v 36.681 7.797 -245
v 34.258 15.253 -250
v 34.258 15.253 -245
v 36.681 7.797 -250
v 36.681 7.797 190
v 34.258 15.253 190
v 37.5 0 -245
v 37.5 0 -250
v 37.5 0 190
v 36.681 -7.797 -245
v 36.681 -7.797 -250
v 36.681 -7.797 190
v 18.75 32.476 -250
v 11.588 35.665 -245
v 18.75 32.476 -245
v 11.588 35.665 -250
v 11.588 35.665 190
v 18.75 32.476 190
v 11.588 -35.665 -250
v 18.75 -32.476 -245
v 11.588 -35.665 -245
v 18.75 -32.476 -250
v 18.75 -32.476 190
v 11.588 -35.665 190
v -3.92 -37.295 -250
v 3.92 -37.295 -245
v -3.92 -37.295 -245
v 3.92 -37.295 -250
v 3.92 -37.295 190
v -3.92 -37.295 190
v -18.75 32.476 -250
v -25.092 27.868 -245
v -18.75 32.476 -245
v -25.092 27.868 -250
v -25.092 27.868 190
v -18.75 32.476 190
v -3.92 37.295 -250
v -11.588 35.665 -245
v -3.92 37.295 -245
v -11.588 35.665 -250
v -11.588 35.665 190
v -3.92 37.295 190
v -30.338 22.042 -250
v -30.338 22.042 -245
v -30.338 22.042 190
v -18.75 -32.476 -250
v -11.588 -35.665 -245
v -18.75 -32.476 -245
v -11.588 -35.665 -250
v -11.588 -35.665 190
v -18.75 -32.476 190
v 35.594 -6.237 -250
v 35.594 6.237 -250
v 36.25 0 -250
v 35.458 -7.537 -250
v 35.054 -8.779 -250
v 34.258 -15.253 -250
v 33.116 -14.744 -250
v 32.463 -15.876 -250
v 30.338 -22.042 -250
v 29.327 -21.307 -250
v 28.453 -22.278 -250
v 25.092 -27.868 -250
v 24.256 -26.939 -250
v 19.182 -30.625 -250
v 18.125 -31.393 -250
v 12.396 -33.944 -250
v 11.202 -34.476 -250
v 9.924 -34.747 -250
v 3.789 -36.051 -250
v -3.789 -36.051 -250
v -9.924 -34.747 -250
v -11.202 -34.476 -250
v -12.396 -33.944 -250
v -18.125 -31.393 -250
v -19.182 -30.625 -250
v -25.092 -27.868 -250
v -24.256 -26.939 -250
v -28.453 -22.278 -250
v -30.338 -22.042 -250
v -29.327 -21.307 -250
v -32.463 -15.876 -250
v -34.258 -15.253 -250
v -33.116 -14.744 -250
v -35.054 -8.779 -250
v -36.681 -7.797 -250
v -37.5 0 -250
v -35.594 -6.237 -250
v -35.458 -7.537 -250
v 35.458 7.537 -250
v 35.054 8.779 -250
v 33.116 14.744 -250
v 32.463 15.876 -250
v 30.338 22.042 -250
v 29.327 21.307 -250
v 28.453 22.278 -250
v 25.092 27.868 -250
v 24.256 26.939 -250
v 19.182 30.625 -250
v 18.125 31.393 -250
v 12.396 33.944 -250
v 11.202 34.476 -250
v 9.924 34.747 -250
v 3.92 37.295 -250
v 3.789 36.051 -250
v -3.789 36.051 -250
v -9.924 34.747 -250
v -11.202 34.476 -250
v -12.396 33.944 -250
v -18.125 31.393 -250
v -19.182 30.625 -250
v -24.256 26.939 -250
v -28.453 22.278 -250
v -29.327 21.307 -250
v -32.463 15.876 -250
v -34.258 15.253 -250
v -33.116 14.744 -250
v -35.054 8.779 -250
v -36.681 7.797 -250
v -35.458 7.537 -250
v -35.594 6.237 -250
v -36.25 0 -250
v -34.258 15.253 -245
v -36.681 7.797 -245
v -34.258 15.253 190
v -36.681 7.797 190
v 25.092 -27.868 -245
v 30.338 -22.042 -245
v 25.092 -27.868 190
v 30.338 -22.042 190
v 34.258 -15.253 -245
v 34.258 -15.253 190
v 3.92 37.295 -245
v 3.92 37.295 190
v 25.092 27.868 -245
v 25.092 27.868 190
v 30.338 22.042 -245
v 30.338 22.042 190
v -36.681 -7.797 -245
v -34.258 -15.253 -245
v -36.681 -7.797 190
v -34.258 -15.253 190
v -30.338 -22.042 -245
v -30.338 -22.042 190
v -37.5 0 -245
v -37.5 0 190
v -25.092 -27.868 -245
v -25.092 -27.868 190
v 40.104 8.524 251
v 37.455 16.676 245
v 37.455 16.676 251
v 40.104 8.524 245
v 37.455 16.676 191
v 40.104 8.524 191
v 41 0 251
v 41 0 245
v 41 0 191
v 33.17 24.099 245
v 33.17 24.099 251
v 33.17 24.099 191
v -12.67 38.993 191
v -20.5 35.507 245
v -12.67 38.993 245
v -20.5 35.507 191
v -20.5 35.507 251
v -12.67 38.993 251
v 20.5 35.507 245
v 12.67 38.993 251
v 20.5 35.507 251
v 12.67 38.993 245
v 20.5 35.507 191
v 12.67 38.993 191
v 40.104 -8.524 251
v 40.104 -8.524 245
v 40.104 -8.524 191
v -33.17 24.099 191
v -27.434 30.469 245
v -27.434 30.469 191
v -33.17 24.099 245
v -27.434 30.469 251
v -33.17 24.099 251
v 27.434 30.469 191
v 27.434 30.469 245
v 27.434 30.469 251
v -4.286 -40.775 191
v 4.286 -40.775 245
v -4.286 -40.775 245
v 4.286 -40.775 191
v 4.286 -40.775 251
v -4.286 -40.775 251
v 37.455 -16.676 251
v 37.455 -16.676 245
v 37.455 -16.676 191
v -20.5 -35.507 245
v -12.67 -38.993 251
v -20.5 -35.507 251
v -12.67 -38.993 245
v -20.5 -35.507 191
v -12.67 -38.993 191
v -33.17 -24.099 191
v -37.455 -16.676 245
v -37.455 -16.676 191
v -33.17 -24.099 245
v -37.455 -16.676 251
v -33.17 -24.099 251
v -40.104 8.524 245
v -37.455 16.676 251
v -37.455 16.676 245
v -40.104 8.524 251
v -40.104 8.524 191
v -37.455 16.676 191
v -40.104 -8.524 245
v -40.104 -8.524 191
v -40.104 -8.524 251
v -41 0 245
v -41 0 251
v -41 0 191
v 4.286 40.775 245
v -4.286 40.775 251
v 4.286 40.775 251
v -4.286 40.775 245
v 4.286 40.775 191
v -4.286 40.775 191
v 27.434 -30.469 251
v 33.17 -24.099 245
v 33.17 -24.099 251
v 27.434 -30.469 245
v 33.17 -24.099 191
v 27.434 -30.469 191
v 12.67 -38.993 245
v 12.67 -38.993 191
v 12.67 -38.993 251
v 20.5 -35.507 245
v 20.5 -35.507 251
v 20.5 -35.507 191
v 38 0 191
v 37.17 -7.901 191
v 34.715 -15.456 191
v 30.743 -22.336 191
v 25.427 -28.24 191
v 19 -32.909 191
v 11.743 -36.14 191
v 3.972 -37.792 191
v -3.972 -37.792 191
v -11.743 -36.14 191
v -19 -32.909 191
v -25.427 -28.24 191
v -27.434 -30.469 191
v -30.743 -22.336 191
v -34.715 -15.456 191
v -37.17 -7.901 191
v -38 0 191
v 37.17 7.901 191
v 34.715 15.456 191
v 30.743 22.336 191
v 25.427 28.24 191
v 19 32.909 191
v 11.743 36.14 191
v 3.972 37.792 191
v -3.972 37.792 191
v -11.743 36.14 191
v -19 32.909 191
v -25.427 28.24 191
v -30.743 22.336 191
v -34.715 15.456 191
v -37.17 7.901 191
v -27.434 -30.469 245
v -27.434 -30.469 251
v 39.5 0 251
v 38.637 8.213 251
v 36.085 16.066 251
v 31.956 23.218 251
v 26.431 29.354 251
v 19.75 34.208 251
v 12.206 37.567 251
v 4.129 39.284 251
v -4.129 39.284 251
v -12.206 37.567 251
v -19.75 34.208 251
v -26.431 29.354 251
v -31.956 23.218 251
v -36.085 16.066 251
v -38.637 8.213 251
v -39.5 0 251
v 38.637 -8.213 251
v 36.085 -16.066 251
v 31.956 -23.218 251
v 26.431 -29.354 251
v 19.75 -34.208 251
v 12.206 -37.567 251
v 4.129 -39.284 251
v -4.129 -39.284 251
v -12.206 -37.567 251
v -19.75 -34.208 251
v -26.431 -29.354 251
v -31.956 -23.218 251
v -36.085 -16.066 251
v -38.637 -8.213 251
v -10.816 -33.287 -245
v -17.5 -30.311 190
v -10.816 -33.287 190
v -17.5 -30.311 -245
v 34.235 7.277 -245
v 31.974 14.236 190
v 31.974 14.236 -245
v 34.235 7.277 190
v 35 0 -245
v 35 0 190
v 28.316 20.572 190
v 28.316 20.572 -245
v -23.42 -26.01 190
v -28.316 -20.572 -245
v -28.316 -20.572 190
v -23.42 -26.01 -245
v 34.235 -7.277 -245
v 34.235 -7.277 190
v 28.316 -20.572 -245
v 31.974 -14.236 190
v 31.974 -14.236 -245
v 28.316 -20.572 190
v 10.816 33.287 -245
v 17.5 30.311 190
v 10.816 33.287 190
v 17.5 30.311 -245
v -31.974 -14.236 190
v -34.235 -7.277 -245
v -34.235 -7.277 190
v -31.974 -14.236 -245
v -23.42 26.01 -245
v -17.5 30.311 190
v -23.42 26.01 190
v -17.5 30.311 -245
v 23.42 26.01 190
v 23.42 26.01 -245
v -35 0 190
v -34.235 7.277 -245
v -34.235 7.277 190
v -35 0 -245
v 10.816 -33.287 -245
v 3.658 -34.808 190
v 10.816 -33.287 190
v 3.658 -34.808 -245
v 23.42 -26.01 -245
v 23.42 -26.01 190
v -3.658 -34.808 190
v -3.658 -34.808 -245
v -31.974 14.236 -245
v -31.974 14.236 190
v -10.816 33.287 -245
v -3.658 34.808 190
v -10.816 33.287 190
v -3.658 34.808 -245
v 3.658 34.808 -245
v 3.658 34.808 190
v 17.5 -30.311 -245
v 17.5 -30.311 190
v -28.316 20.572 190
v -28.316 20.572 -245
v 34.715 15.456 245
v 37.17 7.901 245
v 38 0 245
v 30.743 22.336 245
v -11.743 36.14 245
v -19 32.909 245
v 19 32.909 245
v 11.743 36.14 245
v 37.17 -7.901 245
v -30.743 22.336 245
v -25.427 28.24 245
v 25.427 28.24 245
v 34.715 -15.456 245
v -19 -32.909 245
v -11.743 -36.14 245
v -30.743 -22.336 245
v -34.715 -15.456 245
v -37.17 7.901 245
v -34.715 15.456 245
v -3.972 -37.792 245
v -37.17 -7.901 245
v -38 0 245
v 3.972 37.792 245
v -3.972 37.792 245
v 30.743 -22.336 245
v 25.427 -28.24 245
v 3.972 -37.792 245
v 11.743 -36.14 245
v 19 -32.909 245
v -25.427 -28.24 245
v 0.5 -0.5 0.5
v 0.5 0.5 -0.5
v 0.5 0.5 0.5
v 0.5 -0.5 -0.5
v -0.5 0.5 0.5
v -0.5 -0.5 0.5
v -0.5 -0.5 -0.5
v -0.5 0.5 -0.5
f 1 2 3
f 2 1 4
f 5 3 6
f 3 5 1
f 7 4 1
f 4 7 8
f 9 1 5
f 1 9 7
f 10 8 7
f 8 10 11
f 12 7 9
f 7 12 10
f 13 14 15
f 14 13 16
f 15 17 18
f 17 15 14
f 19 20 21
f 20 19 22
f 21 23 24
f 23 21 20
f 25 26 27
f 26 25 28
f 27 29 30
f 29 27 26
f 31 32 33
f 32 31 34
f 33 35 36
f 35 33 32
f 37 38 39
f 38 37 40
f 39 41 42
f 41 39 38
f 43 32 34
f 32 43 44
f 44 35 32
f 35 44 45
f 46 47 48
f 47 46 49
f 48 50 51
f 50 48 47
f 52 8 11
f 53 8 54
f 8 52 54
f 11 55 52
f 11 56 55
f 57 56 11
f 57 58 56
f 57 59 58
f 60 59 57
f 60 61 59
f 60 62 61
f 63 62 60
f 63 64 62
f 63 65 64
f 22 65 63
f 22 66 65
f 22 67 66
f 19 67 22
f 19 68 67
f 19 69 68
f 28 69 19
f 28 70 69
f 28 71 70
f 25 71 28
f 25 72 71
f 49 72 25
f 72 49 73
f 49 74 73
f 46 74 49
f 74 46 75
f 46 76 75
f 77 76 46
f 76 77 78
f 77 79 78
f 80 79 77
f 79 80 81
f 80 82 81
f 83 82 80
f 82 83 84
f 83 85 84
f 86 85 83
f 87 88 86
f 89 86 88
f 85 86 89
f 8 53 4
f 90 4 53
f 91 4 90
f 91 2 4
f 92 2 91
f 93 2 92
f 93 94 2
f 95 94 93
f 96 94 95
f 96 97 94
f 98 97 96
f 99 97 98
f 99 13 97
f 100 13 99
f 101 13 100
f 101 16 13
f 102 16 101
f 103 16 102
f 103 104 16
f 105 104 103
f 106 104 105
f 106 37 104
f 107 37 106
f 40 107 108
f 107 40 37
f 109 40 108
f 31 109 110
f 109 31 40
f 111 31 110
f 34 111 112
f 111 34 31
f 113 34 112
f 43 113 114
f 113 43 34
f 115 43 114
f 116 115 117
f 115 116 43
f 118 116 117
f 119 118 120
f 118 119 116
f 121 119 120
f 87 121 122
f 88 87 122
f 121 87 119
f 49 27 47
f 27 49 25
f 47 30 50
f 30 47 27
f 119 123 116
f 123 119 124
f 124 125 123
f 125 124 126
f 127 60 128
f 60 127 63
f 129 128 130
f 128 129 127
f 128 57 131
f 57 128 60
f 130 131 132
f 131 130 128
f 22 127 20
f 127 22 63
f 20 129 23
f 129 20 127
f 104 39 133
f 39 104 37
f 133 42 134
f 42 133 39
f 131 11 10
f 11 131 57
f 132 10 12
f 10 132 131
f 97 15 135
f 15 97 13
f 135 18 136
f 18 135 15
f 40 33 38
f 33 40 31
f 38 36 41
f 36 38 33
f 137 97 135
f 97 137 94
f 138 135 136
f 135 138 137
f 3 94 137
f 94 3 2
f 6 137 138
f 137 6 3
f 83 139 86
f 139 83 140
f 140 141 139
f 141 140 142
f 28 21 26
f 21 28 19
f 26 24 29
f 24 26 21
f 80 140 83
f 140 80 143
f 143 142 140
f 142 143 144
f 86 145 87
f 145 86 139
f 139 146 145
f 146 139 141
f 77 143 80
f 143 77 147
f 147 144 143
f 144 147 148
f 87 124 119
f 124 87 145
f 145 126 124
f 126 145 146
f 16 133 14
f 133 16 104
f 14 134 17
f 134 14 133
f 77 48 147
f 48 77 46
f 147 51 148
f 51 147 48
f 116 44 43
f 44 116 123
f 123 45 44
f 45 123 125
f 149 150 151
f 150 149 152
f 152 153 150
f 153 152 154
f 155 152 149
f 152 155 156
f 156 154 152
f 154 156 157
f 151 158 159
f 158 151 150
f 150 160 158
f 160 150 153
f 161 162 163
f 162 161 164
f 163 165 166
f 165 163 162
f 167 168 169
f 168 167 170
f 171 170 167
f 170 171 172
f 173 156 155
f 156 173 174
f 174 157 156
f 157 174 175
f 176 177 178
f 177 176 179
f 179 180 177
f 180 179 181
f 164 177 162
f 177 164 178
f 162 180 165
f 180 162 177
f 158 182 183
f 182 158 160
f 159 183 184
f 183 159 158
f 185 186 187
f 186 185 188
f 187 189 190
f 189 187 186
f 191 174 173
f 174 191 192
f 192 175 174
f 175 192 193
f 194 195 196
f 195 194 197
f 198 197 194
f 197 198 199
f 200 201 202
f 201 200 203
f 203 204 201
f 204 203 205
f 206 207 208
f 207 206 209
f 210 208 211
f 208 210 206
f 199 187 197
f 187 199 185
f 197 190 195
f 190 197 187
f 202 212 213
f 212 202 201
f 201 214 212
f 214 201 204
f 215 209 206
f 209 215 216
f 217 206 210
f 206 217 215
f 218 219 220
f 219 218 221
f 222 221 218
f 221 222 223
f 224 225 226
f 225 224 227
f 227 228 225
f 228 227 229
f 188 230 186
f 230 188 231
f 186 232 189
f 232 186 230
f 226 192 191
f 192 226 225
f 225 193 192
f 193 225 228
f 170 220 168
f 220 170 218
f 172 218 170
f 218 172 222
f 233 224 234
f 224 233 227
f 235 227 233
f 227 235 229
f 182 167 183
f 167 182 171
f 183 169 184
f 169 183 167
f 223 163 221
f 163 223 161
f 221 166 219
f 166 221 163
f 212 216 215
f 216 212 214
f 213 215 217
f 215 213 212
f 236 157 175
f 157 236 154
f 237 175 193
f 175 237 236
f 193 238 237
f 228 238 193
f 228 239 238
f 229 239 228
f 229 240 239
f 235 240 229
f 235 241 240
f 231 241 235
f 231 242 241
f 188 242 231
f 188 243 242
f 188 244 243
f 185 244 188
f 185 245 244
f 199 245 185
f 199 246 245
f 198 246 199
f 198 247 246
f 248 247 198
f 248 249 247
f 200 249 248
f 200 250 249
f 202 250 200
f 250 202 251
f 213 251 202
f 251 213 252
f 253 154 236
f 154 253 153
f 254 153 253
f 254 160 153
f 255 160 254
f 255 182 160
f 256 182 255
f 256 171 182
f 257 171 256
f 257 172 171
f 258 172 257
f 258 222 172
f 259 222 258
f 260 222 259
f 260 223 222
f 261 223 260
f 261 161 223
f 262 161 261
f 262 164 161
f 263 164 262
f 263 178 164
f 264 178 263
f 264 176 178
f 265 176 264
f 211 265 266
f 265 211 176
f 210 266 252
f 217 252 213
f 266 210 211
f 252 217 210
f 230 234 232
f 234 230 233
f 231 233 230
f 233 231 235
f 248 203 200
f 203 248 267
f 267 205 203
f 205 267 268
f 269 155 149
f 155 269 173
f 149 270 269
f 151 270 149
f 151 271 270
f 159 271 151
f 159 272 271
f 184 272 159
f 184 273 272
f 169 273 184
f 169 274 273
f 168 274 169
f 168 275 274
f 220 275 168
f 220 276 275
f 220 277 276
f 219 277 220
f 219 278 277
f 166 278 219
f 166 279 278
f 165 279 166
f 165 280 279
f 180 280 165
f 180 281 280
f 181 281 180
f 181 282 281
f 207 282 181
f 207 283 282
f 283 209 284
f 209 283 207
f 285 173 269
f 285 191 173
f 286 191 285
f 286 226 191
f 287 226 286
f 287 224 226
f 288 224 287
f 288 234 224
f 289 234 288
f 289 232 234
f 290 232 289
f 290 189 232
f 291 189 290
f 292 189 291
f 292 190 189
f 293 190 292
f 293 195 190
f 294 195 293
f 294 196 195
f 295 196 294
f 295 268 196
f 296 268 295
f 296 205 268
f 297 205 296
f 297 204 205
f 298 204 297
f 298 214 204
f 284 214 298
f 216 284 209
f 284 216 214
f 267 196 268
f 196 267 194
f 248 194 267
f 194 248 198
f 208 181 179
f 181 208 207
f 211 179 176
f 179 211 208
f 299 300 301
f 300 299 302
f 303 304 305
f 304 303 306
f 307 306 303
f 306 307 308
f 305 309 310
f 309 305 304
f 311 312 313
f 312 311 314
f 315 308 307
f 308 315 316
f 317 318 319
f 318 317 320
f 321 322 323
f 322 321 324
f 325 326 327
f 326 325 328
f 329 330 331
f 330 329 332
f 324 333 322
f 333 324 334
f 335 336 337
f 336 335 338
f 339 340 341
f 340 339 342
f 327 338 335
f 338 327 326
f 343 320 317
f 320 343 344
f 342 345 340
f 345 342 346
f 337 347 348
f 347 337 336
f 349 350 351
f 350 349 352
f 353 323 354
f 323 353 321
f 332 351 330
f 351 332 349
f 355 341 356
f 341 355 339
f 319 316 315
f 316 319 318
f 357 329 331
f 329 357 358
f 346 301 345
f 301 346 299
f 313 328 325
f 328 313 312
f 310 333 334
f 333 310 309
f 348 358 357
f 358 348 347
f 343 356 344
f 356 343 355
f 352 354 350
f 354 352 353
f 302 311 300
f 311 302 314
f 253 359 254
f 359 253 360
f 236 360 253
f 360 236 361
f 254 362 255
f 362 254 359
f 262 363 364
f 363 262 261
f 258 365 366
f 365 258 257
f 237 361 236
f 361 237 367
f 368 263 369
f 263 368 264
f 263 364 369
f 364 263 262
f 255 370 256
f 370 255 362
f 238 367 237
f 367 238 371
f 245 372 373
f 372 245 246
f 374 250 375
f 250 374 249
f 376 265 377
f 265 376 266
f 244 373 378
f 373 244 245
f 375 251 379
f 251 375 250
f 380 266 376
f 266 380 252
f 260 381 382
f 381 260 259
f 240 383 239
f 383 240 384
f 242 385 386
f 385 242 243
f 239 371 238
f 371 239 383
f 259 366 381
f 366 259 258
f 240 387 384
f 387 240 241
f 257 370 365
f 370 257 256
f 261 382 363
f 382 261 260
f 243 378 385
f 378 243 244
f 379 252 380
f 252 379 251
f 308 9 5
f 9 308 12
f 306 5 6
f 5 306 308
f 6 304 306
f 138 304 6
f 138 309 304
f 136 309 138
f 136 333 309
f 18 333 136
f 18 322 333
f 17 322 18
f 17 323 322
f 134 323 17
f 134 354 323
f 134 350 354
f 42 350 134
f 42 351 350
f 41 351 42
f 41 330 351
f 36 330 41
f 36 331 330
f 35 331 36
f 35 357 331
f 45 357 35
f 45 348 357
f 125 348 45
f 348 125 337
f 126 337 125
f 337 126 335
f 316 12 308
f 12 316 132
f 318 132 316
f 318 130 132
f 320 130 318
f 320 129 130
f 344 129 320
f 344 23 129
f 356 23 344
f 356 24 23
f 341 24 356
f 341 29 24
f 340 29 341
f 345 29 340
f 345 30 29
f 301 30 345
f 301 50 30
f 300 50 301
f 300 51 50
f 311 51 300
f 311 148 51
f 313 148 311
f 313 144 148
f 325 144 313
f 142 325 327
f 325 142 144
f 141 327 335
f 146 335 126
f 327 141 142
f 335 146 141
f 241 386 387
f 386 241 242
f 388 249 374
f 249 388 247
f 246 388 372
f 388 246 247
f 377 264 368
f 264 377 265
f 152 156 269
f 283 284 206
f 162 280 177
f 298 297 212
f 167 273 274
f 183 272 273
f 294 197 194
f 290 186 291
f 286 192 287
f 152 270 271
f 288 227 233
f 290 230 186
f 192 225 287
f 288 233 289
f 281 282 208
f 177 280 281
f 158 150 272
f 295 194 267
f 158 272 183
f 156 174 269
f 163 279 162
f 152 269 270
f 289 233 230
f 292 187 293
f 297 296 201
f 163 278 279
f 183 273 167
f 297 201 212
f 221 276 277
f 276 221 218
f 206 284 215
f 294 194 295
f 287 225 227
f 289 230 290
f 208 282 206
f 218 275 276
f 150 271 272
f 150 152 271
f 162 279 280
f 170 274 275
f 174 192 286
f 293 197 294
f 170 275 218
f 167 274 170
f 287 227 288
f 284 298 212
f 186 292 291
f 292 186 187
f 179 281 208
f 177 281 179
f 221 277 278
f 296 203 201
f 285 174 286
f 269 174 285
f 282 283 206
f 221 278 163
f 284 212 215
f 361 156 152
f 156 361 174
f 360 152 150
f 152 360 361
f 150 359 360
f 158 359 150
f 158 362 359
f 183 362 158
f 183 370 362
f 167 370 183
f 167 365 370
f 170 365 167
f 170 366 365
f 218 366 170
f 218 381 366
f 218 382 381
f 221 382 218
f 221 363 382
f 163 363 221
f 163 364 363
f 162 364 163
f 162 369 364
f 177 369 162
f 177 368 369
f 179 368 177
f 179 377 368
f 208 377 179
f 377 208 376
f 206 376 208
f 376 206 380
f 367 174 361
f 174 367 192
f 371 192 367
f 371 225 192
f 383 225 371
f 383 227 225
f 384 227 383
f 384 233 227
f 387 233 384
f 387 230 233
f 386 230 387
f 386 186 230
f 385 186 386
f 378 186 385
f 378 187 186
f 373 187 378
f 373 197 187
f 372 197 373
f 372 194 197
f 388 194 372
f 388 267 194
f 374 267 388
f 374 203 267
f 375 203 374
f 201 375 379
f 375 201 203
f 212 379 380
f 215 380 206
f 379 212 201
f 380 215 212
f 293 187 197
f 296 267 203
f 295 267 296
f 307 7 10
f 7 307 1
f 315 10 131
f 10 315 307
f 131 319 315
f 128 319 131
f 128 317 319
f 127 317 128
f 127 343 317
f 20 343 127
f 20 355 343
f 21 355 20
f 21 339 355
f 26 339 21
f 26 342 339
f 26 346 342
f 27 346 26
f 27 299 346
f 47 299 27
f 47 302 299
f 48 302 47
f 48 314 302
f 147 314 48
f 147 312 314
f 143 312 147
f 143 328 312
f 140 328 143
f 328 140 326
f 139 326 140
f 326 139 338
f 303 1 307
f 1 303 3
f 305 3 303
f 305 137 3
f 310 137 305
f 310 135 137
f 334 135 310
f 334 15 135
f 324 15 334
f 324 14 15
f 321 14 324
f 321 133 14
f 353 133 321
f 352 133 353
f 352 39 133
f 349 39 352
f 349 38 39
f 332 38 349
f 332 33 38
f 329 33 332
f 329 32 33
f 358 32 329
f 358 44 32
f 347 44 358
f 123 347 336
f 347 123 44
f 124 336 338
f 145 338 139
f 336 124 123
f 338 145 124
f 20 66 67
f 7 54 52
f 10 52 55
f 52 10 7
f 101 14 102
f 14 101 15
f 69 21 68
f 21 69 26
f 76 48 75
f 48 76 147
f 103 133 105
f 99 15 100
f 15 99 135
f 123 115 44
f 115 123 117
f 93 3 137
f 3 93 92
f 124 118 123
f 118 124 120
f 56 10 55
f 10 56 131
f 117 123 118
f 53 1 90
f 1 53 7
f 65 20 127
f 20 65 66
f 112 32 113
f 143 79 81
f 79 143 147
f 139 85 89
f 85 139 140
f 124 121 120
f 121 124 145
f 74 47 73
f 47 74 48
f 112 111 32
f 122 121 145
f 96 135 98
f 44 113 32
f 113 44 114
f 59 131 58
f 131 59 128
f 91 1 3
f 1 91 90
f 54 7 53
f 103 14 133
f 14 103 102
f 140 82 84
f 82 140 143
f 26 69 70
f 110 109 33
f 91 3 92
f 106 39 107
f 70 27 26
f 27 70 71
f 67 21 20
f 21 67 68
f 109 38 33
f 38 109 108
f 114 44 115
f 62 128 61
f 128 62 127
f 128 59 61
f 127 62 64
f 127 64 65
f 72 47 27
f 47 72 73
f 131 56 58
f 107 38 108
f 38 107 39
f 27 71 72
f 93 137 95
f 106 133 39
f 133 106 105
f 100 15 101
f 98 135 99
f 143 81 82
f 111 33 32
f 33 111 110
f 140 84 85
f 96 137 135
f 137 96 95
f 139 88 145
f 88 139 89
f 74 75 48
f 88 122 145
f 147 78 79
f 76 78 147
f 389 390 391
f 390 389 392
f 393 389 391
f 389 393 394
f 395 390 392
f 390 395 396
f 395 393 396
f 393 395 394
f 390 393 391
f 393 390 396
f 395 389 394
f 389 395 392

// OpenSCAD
// Parameters
pipe_length = 500; //[250:1000:1]
outer_diameter = 75; //[40:150:1]
wall_thickness = 2.5; //[1.2:6:0.1]
inner_diameter = 70; //[35:145:1]
socket_length = 60; //[30:120:1]
socket_outer_diameter = 82; //[60:160:1]
socket_wall_thickness = 3; //[1.5:8:0.1]
chamfer_length = 6; //[2:15:0.5]
chamfer_radial = 1.5; //[0.5:4:0.1]
overlap = 1; //[0.5:2:0.1]

// Base Shapes
module pipe_outer() {
  translate([0, 0, 0])
    cylinder(h=pipe_length, r=outer_diameter/2, center=true);
}

module inner_bore() {
  translate([0, 0, 0])
    cylinder(h=pipe_length + 2*overlap, r=inner_diameter/2, center=true);
}

module socket_outer() {
  translate([0, 0, pipe_length/2 - socket_length/2 + overlap])
    cylinder(h=socket_length, r=socket_outer_diameter/2, center=true);
}

module socket_inner_bore() {
  translate([0, 0, pipe_length/2 - socket_length/2 + overlap])
    cylinder(h=socket_length + 2*overlap, r=socket_outer_diameter/2 - socket_wall_thickness, center=true);
}

module chamfer_cut_socket_end() {
  translate([0, 0, pipe_length/2 - chamfer_length/2 + overlap])
    cylinder(h=chamfer_length, r1=socket_outer_diameter/2, r2=socket_outer_diameter/2 - chamfer_radial, center=true);
}

module chamfer_cut_plain_end() {
  translate([0, 0, -pipe_length/2 + chamfer_length/2 - overlap])
    rotate([180, 0, 0])
    cylinder(h=chamfer_length, r1=outer_diameter/2, r2=outer_diameter/2 - chamfer_radial, center=true);
}

module markings_text() {
  translate([0, 0, 0])
    cube([overlap, overlap, overlap], center=true);
}

// Operations
module pipe_plus_socket_outer() {
  union() {
    pipe_outer();
    socket_outer();
  }
}

module pipe_with_bores() {
  difference() {
    pipe_plus_socket_outer();
    inner_bore();
    socket_inner_bore();
  }
}

module pipe_with_chamfers() {
  difference() {
    pipe_with_bores();
    chamfer_cut_socket_end();
    chamfer_cut_plain_end();
  }
}

module pipe_complete() {
  union() {
    pipe_with_chamfers();
    markings_text();
  }
}

// Final Output
pipe_complete();
